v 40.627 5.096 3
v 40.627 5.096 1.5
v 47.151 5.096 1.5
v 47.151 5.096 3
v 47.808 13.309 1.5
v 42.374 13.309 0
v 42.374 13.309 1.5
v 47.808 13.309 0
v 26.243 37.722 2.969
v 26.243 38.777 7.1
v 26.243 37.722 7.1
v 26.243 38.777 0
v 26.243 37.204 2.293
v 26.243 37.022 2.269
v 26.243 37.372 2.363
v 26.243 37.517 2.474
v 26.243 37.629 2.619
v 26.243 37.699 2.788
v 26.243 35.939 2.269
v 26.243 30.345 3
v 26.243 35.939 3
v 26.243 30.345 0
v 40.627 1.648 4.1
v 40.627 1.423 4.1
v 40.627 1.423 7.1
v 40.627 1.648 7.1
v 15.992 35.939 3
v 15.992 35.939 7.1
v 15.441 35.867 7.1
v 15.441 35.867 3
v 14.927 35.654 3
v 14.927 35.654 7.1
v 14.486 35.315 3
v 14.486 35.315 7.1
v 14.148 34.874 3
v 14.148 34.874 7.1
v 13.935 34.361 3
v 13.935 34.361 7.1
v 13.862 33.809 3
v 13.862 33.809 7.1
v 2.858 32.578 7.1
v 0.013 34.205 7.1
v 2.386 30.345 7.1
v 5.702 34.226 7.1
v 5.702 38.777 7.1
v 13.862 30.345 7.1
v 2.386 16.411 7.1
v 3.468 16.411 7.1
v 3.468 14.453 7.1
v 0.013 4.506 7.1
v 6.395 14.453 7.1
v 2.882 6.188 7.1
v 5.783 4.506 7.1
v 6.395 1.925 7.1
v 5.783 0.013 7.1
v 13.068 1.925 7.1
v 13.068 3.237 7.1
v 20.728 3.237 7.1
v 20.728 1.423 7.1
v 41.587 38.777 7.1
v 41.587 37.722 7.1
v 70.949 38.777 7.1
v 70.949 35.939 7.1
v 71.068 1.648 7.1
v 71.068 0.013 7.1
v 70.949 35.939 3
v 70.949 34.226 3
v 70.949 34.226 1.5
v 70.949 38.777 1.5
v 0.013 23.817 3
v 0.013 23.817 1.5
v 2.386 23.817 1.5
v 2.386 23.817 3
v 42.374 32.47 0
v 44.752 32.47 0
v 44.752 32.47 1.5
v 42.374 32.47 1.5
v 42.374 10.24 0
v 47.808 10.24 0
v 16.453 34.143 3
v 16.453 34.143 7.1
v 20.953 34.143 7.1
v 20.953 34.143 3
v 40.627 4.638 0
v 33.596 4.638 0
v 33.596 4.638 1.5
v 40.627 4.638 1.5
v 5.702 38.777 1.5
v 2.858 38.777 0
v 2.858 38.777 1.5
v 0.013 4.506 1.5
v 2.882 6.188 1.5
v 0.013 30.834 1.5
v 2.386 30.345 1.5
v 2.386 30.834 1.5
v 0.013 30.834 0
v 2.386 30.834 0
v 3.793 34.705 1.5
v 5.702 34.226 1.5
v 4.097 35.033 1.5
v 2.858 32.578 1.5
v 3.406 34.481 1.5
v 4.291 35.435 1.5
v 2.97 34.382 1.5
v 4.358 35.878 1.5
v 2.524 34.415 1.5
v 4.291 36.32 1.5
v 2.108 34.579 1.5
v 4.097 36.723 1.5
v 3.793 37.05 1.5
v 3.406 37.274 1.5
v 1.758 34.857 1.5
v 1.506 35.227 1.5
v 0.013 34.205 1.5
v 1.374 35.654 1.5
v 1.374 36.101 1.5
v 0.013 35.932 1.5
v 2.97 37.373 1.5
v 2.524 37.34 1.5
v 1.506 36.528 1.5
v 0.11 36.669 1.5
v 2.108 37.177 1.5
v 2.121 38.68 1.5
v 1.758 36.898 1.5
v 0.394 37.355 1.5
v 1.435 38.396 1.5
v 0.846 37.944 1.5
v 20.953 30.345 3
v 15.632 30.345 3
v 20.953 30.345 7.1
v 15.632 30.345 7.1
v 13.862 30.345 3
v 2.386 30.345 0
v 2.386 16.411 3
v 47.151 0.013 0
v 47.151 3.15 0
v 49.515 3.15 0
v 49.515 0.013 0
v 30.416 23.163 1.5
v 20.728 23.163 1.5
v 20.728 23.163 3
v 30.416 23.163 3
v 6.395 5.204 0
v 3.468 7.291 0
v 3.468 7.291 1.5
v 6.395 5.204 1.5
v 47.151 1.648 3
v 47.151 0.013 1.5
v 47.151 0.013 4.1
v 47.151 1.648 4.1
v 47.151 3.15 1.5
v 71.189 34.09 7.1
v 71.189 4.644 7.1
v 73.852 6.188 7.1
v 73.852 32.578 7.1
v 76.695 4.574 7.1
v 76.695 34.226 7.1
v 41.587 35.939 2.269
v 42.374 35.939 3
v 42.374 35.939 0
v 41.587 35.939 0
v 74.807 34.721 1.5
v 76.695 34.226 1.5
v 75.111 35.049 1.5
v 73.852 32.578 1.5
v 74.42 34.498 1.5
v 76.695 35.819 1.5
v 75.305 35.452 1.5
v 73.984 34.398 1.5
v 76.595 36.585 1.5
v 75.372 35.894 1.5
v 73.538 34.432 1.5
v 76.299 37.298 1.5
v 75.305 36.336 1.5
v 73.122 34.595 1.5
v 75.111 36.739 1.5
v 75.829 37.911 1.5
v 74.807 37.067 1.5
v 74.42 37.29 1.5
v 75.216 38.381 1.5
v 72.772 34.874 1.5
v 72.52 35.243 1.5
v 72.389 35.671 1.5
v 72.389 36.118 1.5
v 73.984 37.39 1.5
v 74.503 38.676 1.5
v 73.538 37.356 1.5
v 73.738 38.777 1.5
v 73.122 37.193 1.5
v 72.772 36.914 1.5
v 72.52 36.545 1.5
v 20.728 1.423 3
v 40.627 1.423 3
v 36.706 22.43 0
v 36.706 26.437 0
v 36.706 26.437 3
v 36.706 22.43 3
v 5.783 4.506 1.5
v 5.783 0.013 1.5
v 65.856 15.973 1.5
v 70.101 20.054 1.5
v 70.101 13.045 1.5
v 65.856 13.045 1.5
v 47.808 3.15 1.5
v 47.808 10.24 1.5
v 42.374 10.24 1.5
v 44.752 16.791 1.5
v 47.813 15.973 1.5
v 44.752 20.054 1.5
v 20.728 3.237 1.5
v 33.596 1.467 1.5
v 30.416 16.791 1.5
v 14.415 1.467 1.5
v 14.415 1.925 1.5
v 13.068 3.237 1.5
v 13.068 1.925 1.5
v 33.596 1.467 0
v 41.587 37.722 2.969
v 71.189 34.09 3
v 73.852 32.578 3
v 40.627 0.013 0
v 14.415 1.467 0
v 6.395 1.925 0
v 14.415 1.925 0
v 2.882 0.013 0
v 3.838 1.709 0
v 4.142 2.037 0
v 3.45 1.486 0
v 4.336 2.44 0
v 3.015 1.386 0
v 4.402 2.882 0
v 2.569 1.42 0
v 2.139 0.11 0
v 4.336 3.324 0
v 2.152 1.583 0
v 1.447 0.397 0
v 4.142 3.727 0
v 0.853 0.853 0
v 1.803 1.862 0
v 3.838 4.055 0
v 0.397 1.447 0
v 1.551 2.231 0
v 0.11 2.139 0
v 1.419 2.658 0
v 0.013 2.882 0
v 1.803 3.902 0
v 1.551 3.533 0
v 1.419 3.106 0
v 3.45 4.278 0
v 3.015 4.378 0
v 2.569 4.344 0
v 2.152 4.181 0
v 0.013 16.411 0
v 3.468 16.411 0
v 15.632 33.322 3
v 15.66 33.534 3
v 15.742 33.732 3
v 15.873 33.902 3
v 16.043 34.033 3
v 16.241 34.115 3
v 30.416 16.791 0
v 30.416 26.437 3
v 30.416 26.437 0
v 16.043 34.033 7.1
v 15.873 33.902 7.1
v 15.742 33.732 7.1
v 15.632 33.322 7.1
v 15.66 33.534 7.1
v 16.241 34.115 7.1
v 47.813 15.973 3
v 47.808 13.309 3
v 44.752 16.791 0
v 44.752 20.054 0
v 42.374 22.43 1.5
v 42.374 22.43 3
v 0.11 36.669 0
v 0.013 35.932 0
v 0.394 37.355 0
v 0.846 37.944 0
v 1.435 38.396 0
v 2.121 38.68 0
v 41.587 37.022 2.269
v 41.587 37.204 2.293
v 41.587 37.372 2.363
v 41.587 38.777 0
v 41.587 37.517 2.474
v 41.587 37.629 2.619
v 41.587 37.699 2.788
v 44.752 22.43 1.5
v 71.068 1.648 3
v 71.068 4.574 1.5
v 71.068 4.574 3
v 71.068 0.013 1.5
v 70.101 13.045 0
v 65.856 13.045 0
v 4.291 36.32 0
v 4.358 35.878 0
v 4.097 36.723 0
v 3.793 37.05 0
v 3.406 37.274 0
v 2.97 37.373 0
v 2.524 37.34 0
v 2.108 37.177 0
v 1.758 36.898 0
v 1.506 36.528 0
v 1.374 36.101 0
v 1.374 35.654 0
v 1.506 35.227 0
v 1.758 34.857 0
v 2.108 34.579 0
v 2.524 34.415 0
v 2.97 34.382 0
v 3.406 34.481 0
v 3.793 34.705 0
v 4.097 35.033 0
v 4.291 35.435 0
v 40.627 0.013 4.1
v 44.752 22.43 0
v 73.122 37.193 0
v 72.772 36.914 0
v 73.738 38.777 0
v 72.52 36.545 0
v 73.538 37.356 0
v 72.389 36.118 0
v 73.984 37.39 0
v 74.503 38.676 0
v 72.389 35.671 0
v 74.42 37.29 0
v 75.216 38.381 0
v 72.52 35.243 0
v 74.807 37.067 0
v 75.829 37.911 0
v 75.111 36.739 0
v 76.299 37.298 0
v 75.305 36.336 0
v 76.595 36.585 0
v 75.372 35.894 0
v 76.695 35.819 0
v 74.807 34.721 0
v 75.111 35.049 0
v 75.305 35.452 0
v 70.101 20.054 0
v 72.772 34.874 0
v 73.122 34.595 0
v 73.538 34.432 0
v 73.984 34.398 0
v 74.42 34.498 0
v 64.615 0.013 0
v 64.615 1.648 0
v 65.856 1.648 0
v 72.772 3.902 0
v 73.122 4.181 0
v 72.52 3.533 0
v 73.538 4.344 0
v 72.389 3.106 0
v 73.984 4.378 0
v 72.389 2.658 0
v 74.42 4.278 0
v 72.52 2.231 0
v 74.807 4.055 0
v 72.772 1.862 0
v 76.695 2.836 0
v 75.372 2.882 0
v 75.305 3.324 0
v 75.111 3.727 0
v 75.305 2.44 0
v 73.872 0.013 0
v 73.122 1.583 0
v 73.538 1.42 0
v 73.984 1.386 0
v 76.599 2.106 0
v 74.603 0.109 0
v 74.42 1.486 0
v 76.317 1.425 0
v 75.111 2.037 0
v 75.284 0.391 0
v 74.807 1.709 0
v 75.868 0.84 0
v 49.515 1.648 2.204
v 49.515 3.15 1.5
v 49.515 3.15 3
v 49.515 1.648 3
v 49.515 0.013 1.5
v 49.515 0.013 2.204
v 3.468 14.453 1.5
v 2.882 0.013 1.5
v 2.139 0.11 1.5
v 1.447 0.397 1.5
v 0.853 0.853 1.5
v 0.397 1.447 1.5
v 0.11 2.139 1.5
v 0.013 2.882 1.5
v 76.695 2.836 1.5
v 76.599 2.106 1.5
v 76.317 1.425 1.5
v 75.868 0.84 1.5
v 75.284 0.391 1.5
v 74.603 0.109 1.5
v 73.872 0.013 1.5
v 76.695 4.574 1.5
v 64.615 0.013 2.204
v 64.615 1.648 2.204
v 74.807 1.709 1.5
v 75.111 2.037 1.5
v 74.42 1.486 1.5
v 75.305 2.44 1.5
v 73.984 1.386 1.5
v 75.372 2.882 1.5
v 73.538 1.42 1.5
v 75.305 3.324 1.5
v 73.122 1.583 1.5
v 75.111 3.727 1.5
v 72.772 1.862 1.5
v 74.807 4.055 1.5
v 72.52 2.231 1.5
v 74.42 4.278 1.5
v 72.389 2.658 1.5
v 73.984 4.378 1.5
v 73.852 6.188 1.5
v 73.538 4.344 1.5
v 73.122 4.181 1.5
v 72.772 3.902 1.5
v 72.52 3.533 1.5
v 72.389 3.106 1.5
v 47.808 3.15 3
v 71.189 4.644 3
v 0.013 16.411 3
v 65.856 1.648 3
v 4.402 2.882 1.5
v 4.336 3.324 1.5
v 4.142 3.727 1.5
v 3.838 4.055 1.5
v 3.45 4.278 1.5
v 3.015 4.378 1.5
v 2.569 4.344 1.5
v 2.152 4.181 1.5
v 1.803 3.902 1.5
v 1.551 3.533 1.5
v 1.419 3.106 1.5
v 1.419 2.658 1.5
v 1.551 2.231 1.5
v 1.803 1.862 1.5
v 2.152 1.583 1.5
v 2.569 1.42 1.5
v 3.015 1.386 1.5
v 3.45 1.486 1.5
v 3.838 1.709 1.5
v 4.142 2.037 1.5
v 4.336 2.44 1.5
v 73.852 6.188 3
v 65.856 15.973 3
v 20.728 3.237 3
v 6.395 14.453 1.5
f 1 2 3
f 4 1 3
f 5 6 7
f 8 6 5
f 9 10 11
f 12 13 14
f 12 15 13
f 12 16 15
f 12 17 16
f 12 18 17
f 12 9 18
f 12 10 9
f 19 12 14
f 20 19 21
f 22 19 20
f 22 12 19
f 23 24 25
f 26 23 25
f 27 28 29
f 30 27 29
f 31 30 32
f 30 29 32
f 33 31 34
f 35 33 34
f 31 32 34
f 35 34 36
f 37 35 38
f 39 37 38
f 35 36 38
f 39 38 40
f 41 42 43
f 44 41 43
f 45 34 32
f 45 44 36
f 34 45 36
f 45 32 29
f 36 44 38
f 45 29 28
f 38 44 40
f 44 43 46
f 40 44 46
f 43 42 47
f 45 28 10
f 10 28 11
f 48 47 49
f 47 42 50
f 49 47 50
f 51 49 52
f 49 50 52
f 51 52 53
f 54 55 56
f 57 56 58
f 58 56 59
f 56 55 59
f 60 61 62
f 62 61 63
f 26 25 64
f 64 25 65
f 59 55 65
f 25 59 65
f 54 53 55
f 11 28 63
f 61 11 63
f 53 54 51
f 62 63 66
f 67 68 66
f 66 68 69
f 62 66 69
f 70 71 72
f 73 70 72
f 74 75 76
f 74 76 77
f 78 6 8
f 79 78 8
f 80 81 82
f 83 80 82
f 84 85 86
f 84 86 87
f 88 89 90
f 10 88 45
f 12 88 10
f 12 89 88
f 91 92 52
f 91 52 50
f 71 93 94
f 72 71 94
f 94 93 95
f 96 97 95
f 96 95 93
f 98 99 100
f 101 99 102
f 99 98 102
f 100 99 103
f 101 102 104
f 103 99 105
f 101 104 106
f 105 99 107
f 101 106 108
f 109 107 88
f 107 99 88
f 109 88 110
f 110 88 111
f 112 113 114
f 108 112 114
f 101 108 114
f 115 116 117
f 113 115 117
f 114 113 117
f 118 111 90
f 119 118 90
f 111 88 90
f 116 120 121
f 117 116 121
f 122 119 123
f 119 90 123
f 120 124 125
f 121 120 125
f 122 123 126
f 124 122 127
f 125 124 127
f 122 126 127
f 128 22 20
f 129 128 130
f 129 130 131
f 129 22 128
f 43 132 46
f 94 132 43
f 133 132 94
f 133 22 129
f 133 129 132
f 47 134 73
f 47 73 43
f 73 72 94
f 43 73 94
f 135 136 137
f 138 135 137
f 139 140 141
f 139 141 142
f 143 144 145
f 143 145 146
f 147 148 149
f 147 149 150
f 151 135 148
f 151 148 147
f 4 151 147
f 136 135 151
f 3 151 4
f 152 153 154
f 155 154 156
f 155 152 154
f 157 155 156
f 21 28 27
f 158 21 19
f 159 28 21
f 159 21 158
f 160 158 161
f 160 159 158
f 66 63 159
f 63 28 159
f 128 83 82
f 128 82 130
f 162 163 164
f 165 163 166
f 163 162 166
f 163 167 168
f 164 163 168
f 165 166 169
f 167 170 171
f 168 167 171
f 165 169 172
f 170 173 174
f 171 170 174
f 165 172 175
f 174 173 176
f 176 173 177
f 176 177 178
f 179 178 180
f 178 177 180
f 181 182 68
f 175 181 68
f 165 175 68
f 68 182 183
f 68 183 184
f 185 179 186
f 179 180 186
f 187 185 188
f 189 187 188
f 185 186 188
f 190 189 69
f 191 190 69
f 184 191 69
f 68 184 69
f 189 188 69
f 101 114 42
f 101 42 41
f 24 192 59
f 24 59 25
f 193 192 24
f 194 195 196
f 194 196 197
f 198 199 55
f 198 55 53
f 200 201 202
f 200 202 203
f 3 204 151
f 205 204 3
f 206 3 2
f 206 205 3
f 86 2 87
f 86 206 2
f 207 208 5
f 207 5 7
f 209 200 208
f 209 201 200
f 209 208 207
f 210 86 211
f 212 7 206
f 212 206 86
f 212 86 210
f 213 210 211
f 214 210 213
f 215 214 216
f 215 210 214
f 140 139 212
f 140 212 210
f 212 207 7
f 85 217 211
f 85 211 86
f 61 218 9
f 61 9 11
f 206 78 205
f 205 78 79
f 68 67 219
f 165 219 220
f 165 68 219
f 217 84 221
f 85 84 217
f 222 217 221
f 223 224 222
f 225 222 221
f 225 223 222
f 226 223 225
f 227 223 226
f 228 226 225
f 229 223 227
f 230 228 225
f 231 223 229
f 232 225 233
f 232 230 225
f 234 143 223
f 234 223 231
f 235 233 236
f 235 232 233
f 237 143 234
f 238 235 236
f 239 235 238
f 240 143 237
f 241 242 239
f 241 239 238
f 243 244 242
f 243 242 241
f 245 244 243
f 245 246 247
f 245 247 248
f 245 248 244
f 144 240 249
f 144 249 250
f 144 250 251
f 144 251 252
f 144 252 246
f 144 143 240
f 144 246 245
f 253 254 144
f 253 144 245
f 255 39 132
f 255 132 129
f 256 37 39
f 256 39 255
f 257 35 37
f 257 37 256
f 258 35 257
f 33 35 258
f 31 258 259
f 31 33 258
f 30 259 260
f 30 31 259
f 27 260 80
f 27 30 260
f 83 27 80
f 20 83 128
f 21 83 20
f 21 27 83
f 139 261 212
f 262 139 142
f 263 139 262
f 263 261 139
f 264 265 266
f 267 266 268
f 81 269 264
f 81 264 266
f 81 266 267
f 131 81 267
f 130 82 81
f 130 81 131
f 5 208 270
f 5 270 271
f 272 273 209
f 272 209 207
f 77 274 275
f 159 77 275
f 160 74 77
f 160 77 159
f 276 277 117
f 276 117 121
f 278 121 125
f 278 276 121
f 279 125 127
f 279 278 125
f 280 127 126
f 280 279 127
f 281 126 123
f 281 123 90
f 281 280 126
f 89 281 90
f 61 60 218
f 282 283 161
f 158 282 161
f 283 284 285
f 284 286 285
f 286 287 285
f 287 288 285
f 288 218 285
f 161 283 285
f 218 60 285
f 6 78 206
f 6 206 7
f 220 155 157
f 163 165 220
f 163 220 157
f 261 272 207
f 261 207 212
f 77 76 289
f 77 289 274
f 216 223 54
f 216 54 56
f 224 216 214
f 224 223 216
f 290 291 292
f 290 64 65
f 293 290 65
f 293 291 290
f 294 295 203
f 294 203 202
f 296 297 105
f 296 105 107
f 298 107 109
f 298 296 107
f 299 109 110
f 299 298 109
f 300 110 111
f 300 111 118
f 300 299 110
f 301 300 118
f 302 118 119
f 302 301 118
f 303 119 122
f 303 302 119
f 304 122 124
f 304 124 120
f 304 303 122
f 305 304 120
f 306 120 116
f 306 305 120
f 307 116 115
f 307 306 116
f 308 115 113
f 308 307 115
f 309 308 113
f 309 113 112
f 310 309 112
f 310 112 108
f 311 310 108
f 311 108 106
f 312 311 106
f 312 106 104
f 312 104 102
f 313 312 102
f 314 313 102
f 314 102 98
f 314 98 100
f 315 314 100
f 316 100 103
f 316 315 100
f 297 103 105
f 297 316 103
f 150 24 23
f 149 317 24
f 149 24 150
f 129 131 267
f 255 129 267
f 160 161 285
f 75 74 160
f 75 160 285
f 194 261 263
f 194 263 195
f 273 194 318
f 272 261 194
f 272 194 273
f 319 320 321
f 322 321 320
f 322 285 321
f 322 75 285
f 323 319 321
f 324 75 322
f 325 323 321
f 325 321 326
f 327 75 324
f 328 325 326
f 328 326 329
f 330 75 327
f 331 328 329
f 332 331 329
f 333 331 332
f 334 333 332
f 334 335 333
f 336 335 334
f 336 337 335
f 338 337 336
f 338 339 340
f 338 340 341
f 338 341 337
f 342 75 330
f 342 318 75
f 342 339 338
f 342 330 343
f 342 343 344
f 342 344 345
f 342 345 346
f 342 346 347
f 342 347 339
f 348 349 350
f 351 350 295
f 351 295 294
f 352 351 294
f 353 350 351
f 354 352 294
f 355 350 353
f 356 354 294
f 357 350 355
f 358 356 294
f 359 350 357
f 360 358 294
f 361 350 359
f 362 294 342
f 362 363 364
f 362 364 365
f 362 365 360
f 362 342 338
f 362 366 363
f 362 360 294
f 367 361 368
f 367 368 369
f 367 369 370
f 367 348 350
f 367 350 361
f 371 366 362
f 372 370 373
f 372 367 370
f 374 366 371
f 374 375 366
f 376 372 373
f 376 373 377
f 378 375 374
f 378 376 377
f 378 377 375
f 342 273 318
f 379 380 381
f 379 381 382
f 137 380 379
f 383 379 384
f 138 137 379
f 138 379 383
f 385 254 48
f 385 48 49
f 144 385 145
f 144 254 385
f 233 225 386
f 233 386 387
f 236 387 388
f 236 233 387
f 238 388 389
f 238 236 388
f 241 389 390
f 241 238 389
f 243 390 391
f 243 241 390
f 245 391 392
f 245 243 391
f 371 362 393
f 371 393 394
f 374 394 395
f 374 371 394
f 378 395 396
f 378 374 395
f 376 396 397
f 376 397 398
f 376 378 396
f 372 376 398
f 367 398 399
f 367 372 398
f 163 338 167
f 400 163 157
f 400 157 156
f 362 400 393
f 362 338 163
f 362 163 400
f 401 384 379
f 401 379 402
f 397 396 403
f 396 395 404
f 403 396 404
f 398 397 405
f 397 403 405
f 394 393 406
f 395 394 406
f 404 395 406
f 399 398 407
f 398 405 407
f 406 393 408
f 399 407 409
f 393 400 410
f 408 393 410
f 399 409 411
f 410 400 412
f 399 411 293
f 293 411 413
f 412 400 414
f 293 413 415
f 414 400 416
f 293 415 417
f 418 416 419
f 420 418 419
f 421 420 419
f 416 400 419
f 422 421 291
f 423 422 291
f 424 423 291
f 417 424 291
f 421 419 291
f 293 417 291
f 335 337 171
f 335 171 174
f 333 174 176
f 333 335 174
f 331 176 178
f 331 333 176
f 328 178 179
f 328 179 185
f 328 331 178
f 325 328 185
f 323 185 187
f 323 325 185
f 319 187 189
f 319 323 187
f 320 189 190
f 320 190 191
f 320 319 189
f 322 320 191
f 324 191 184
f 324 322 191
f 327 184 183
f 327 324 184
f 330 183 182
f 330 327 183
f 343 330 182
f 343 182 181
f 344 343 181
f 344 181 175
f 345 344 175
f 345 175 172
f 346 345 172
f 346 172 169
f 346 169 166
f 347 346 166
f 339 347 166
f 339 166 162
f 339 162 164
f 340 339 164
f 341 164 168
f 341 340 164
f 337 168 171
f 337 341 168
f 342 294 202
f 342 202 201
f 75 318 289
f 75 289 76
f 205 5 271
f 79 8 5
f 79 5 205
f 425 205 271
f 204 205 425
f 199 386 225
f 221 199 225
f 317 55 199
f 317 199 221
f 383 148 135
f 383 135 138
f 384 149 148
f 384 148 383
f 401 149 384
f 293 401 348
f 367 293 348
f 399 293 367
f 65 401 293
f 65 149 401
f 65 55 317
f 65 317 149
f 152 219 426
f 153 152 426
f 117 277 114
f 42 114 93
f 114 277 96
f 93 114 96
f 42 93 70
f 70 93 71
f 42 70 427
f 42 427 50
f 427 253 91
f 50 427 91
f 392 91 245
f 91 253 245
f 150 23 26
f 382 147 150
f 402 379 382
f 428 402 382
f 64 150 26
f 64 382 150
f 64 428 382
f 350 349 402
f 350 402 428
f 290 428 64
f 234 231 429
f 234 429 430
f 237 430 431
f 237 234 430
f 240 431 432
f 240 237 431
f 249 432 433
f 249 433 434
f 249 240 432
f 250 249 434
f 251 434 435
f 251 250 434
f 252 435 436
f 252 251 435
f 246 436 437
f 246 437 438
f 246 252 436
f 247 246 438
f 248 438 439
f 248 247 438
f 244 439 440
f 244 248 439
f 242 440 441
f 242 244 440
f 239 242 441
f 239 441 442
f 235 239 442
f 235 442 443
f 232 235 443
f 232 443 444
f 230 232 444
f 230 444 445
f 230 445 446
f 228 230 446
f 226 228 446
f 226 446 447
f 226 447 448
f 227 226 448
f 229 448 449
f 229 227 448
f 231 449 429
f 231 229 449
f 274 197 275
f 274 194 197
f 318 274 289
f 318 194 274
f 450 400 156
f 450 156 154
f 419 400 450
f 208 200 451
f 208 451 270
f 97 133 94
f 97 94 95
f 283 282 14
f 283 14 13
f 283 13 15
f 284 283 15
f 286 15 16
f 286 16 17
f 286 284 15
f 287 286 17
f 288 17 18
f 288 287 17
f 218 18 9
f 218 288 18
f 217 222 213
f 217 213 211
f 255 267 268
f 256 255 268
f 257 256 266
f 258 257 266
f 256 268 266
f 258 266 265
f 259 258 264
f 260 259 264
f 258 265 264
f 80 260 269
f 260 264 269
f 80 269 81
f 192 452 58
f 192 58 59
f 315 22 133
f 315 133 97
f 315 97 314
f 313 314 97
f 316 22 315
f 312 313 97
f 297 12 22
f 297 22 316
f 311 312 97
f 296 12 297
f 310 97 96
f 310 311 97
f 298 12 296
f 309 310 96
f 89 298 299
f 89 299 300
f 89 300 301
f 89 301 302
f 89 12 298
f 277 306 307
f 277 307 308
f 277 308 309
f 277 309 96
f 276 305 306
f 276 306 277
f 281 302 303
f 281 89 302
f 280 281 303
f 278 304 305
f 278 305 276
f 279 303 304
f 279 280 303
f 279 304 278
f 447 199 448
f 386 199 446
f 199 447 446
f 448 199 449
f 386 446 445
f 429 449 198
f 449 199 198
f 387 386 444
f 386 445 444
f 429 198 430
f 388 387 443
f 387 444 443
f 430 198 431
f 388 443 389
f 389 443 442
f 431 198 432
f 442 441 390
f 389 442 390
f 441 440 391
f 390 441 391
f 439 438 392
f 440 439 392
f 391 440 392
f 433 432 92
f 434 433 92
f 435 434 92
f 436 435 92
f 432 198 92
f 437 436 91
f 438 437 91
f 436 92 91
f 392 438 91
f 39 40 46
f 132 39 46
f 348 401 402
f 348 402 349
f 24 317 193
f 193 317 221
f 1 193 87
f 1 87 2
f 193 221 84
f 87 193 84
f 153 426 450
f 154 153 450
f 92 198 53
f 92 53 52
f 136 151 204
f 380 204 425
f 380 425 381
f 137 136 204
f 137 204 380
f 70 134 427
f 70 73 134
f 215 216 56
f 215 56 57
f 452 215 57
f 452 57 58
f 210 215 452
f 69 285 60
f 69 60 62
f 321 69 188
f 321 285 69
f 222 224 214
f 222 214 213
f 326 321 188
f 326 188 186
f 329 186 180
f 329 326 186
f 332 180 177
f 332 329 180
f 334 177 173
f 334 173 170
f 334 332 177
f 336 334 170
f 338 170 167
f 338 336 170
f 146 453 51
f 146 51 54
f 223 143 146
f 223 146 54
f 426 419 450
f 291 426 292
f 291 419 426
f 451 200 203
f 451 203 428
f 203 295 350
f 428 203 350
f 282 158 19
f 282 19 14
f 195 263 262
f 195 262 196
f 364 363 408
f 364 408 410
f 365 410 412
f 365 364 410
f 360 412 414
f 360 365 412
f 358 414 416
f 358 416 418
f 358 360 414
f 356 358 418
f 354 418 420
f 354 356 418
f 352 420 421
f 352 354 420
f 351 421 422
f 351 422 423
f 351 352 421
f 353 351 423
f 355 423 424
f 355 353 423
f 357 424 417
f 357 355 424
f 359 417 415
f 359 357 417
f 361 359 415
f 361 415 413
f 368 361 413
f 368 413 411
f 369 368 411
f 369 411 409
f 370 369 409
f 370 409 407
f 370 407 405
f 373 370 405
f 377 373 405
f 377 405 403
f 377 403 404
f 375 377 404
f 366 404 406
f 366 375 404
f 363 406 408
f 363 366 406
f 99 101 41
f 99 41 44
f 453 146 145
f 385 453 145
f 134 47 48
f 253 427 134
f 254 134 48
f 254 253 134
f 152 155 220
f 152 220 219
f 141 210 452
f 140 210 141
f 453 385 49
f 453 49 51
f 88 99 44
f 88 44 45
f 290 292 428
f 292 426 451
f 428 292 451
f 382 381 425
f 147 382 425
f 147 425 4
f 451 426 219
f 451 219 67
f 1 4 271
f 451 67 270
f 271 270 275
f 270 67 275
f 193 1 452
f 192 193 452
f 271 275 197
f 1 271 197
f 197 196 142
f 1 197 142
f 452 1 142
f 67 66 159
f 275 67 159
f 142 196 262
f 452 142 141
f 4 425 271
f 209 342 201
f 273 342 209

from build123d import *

# Parameters (mm, degrees)
SKETCH_1_R          = 1.5
EXTRUDE_1_DEPTH     = 1.5
EXTRUDE_1_2_DEPTH   = 1.5
EXTRUDE_1_3_DEPTH   = 1.5
SKETCH_1_W          = 5.434310226
SKETCH_1_H          = 3.069112814
EXTRUDE_1_4_DEPTH   = 1.5
SKETCH_1_W_2        = 2.364591514
SKETCH_1_H_2        = 3.137743857
EXTRUDE_1_5_DEPTH   = 1.5
EXTRUDE_2_DEPTH     = 1.5
SKETCH_5_W          = 28.57510237
SKETCH_5_H          = 2.837891342
SKETCH_5_W_2        = 23.917529704
SKETCH_5_H_2        = 1.634820582
EXTRUDE_3_DEPTH     = 4.1
SKETCH_6_W          = 0.787454543
SKETCH_6_H          = 7.1
EXTRUDE_4_DEPTH     = 2.837891342
EXTRUDE_5_DEPTH     = 15.344031237
CUT_EXTRUDE_1_DEPTH = 4.1
EXTRUDE_6_DEPTH     = 1.634820582
EXTRUDE_7_REACH     = 88.228
SKETCH_10_W         = 6.524128353
SKETCH_10_H         = 3


with BuildPart() as part:
    # 草图1 → 凸台-拉伸1 (new body)
    with BuildSketch(Plane.XY):
        with BuildLine():
            Line((42.374172917, 38.777020574), (73.737536195, 38.777020574))
            ThreePointArc((73.737536195, 38.777020574), (75.829099502, 37.910666686), (76.695453391, 35.819103378))
            Line((76.695453391, 35.819103378), (76.695453391, 2.836372873))
            ThreePointArc((76.695453391, 2.836372873), (75.868418762, 0.839734655), (73.871780544, 0.012700025))
            Line((73.871780544, 0.012700025), (65.856491688, 0.012700025))
            Line((65.856491688, 0.012700025), (65.856491688, 13.044712807))
            Line((65.856491688, 13.044712807), (70.100741351, 13.044712807))
            Line((70.100741351, 13.044712807), (70.100741351, 20.05420005))
            Line((70.100741351, 20.05420005), (44.751683648, 20.05420005))
            Line((44.751683648, 20.05420005), (44.751683648, 16.790663202))
            Line((44.751683648, 16.790663202), (30.415811039, 16.790663202))
            Line((30.415811039, 16.790663202), (30.415811039, 26.437124649))
            Line((30.415811039, 26.437124649), (36.705891976, 26.437124649))
            Line((36.705891976, 26.437124649), (36.705891976, 22.429523721))
            Line((36.705891976, 22.429523721), (44.751683648, 22.429523721))
            Line((44.751683648, 22.429523721), (44.751683648, 32.470424916))
            Line((44.751683648, 32.470424916), (42.374172917, 32.470424916))
            Line((42.374172917, 32.470424916), (42.374172917, 38.777020574))
        make_face()
        with Locations((73.871780544, 2.882016764)):
            Circle(SKETCH_1_R, mode=Mode.SUBTRACT)
        with Locations((73.871780544, 35.894081788)):
            Circle(SKETCH_1_R, mode=Mode.SUBTRACT)
    extrude(amount=EXTRUDE_1_DEPTH)



with BuildPart() as body_2:
    # 草图1 → Extrude 1 2 (new body)
    with BuildSketch(Plane.XY):
        with BuildLine():
            Line((20.832405991, 0.012700025), (2.882016764, 0.012700025))
            ThreePointArc((2.882016764, 0.012700025), (0.853103441, 0.853103441), (0.012700025, 2.882016764))
            Line((0.012700025, 2.882016764), (0.012700025, 16.410813367))
            Line((0.012700025, 16.410813367), (3.46840969, 16.410813367))
            Line((3.46840969, 16.410813367), (3.46840969, 7.290825892))
            Line((3.46840969, 7.290825892), (6.394972835, 5.203664579))
            Line((6.394972835, 5.203664579), (6.394972835, 1.925003773))
            Line((6.394972835, 1.925003773), (14.41516881, 1.925003773))
            Line((14.41516881, 1.925003773), (14.41516881, 1.467481791))
            Line((14.41516881, 1.467481791), (20.832405991, 1.467481791))
            Line((20.832405991, 1.467481791), (33.595883095, 1.467481791))
            Line((33.595883095, 1.467481791), (33.595883095, 4.637617134))
            Line((33.595883095, 4.637617134), (40.626678312, 4.637617134))
            Line((40.626678312, 4.637617134), (40.626678312, 0.012700025))
            Line((40.626678312, 0.012700025), (33.595883095, 0.012700025))
            Line((33.595883095, 0.012700025), (20.832405991, 0.012700025))
        make_face()
        with Locations((2.902413005, 2.882016764)):
            Circle(SKETCH_1_R, mode=Mode.SUBTRACT)
    extrude(amount=EXTRUDE_1_2_DEPTH)


with BuildPart() as body_3:
    # 草图1 → Extrude 1 3 (new body)
    with BuildSketch(Plane.XY):
        with BuildLine():
            Line((2.857505715, 38.777020574), (26.242687137, 38.777020574))
            Line((26.242687137, 38.777020574), (26.242687137, 30.345137506))
            Line((26.242687137, 30.345137506), (2.385627897, 30.345137506))
            Line((2.385627897, 30.345137506), (2.385627897, 30.834185958))
            Line((2.385627897, 30.834185958), (0.012700025, 30.834185958))
            Line((0.012700025, 30.834185958), (0.012700025, 35.932214884))
            ThreePointArc((0.012700025, 35.932214884), (0.845924321, 37.943796279), (2.857505715, 38.777020574))
        make_face()
        with Locations((2.857505715, 35.877571755)):
            Circle(SKETCH_1_R, mode=Mode.SUBTRACT)
    extrude(amount=EXTRUDE_1_3_DEPTH)


with BuildPart() as body_4:
    # 草图1 → Extrude 1 4 (new body)
    with BuildSketch(Plane.XY):
        with Locations((45.09132803, 11.774429054)):
            Rectangle(SKETCH_1_W, SKETCH_1_H)
    extrude(amount=EXTRUDE_1_4_DEPTH)


with BuildPart() as body_5:
    # 草图1 → Extrude 1 5 (new body)
    with BuildSketch(Plane.XY):
        with Locations((48.333102422, 1.581571954)):
            Rectangle(SKETCH_1_W_2, SKETCH_1_H_2)
    extrude(amount=EXTRUDE_1_5_DEPTH)


with BuildPart() as part_1:
    add(part.part)

    add(body_2.part)  # 凸台-拉伸2 merges body 2

    add(body_3.part)  # 凸台-拉伸2 merges body 3

    add(body_4.part)  # 凸台-拉伸2 merges body 4

    add(body_5.part)  # 凸台-拉伸2 merges body 5
    # 草图3 → 凸台-拉伸2 (add)
    with BuildSketch(Plane.XY.offset(1.5)):
        Polygon((0.012700025, 34.205237949), (0.012700025, 30.834185958), (0.012700025, 23.817436756), (2.385627897, 23.817436756), (2.385627897, 30.345137506), (26.242687137, 30.345137506), (26.242687137, 38.777020574), (5.701940925, 38.777020574), (5.701940925, 34.225848847), (2.857505715, 32.577891407), align=None)
        Polygon((42.374172917, 38.777020574), (70.949275287, 38.777020574), (70.949275287, 34.225848847), (73.852441207, 32.577891407), (76.695453391, 34.225848847), (76.695453391, 4.574174261), (73.852441207, 6.187985945), (71.068336369, 4.574174261), (71.068336369, 0.012700025), (65.856491688, 0.012700025), (65.856491688, 13.044712807), (65.856491688, 15.972548736), (47.813055626, 15.972548736), (47.808483143, 13.308985461), (47.808483143, 3.150443882), (49.515398179, 3.150443882), (49.515398179, 0.012700025), (47.150806665, 0.012700025), (47.150806665, 5.096192633), (42.374172917, 5.096192633), (40.626678312, 5.096192633), (40.626678312, 4.637617134), (40.626678312, 0.012700025), (40.056713733, 0.012700025), (5.783059857, 0.012700025), (5.783059857, 4.506035797), (2.882016764, 6.187985945), (0.012700025, 4.506035797), (0.012700025, 16.410813367), (3.46840969, 16.410813367), (3.46840969, 14.453016608), (6.394972835, 14.453016608), (6.394972835, 10.104845947), (6.394972835, 5.203664579), (6.394972835, 1.925003773), (13.068362142, 1.925003773), (13.068362142, 3.23686167), (20.727981914, 3.23686167), (20.727981914, 23.163322327), (30.415811039, 23.163322327), (30.415811039, 26.437124649), (36.705891976, 26.437124649), (36.705891976, 22.429523721), (42.374172917, 22.429523721), align=None)
    extrude(amount=EXTRUDE_2_DEPTH)

    # 草图5 → 凸台-拉伸3 (add)
    with BuildSketch(Plane.XY.offset(3)):
        with Locations((56.661724102, 37.358074903)):
            Rectangle(SKETCH_5_W, SKETCH_5_H)
        Polygon((76.695453391, 34.225848847), (73.852441207, 32.577891407), (71.189142318, 34.089690367), (71.189142318, 4.64419966), (73.852441207, 6.187985945), (76.695453391, 4.574174261), align=None)
        with Locations((59.109571517, 0.830110316)):
            Rectangle(SKETCH_5_W_2, SKETCH_5_H_2)
        Polygon((40.626678312, 0.012700025), (6.394972835, 0.012700025), (5.783059857, 0.012700025), (5.783059857, 4.506035797), (2.882016764, 6.187985945), (0.012700025, 4.506035797), (0.012700025, 16.410813367), (0.012700025, 23.817436756), (0.012700025, 34.205237949), (2.857505715, 32.577891407), (5.701940925, 34.225848847), (5.701940925, 38.777020574), (26.242687137, 38.777020574), (26.242687137, 35.939129232), (20.953318595, 35.939129232), (20.953318595, 30.345137506), (2.385627897, 30.345137506), (2.385627897, 23.817436756), (2.385627897, 16.410813367), (3.46840969, 16.410813367), (3.46840969, 14.453016608), (6.394972835, 14.453016608), (6.394972835, 1.925003773), (13.068362142, 1.925003773), (13.068362142, 3.23686167), (20.727981914, 3.23686167), (20.727981914, 1.423006096), (40.626678312, 1.423006096), align=None)
    extrude(amount=EXTRUDE_3_DEPTH)

    # 草图6 → 凸台-拉伸4 (add)
    with BuildSketch(Plane(origin=(0, 38.777020574, 0), x_dir=(1, 0, 0), z_dir=(0, 1, 0))):
        with Locations((41.980445645, -3.55)):
            Rectangle(SKETCH_6_W, SKETCH_6_H)
    extrude(amount=-EXTRUDE_4_DEPTH)

    # 草图7 → 凸台-拉伸5 (add)
    with BuildSketch(Plane.ZY.offset(-41.586718374)):
        with BuildLine():
            Line((7.1, 35.939129232), (2.269100337, 35.939129232))
            Line((2.269100337, 35.939129232), (2.269100337, 37.022377445))
            ThreePointArc((2.269100337, 37.022377445), (2.47412559, 37.517352192), (2.969100337, 37.722377445))
            Line((2.969100337, 37.722377445), (7.1, 37.722377445))
            Line((7.1, 37.722377445), (7.1, 35.939129232))
        make_face()
    extrude(amount=EXTRUDE_5_DEPTH)

    # 草图8 → 切除-拉伸1 (cut)
    with BuildSketch(Plane.XY.offset(7.1)):
        with BuildLine():
            Line((20.953318595, 35.939129232), (15.992068639, 35.939129232))
            ThreePointArc((15.992068639, 35.939129232), (14.486042091, 35.31531261), (13.862225469, 33.809286062))
            Line((13.862225469, 33.809286062), (13.862225469, 30.345137506))
            Line((13.862225469, 30.345137506), (15.632095679, 30.345137506))
            Line((15.632095679, 30.345137506), (15.632095679, 33.321819521))
            ThreePointArc((15.632095679, 33.321819521), (15.872616168, 33.902487347), (16.453283994, 34.143007835))
            Line((16.453283994, 34.143007835), (20.953318595, 34.143007835))
            Line((20.953318595, 34.143007835), (20.953318595, 35.939129232))
        make_face()
    extrude(amount=-CUT_EXTRUDE_1_DEPTH, mode=Mode.SUBTRACT)

    # 草图9 → 凸台-拉伸6 (add)
    with BuildSketch(Plane.XZ.offset(-0.012700025)):
        Polygon((49.515398179, 2.203775642), (64.615113945, 2.203775642), (64.615113945, 0), (65.856491688, 0), (65.856491688, 3), (49.515398179, 3), align=None)
    extrude(amount=-EXTRUDE_6_DEPTH)

    # 凸台-拉伸7: up to this face of the body (flat: up to its plane)
    extrude_7_end = Plane(part_1.part.faces().sort_by_distance((59.094076967, 1.647520607, 4.675215674))[0])
    # 草图10 → 凸台-拉伸7 (add, up to the picked face)
    with BuildSketch(Plane.XZ.offset(-0.012700025), mode=Mode.PRIVATE) as extrude_7_sk1:
        with Locations((43.888742489, 5.6)):
            Rectangle(SKETCH_10_W, SKETCH_10_H)
    extrude_7_tool1 = split(extrude(extrude_7_sk1.sketch, amount=-EXTRUDE_7_REACH, mode=Mode.PRIVATE), bisect_by=extrude_7_end, keep=Keep.BOTH, mode=Mode.PRIVATE)
    add(extrude_7_tool1.solids().sort_by(Axis((43.888742, 0.0127, 5.6), (0, 1, 0)))[0])


solid = part_1.part
